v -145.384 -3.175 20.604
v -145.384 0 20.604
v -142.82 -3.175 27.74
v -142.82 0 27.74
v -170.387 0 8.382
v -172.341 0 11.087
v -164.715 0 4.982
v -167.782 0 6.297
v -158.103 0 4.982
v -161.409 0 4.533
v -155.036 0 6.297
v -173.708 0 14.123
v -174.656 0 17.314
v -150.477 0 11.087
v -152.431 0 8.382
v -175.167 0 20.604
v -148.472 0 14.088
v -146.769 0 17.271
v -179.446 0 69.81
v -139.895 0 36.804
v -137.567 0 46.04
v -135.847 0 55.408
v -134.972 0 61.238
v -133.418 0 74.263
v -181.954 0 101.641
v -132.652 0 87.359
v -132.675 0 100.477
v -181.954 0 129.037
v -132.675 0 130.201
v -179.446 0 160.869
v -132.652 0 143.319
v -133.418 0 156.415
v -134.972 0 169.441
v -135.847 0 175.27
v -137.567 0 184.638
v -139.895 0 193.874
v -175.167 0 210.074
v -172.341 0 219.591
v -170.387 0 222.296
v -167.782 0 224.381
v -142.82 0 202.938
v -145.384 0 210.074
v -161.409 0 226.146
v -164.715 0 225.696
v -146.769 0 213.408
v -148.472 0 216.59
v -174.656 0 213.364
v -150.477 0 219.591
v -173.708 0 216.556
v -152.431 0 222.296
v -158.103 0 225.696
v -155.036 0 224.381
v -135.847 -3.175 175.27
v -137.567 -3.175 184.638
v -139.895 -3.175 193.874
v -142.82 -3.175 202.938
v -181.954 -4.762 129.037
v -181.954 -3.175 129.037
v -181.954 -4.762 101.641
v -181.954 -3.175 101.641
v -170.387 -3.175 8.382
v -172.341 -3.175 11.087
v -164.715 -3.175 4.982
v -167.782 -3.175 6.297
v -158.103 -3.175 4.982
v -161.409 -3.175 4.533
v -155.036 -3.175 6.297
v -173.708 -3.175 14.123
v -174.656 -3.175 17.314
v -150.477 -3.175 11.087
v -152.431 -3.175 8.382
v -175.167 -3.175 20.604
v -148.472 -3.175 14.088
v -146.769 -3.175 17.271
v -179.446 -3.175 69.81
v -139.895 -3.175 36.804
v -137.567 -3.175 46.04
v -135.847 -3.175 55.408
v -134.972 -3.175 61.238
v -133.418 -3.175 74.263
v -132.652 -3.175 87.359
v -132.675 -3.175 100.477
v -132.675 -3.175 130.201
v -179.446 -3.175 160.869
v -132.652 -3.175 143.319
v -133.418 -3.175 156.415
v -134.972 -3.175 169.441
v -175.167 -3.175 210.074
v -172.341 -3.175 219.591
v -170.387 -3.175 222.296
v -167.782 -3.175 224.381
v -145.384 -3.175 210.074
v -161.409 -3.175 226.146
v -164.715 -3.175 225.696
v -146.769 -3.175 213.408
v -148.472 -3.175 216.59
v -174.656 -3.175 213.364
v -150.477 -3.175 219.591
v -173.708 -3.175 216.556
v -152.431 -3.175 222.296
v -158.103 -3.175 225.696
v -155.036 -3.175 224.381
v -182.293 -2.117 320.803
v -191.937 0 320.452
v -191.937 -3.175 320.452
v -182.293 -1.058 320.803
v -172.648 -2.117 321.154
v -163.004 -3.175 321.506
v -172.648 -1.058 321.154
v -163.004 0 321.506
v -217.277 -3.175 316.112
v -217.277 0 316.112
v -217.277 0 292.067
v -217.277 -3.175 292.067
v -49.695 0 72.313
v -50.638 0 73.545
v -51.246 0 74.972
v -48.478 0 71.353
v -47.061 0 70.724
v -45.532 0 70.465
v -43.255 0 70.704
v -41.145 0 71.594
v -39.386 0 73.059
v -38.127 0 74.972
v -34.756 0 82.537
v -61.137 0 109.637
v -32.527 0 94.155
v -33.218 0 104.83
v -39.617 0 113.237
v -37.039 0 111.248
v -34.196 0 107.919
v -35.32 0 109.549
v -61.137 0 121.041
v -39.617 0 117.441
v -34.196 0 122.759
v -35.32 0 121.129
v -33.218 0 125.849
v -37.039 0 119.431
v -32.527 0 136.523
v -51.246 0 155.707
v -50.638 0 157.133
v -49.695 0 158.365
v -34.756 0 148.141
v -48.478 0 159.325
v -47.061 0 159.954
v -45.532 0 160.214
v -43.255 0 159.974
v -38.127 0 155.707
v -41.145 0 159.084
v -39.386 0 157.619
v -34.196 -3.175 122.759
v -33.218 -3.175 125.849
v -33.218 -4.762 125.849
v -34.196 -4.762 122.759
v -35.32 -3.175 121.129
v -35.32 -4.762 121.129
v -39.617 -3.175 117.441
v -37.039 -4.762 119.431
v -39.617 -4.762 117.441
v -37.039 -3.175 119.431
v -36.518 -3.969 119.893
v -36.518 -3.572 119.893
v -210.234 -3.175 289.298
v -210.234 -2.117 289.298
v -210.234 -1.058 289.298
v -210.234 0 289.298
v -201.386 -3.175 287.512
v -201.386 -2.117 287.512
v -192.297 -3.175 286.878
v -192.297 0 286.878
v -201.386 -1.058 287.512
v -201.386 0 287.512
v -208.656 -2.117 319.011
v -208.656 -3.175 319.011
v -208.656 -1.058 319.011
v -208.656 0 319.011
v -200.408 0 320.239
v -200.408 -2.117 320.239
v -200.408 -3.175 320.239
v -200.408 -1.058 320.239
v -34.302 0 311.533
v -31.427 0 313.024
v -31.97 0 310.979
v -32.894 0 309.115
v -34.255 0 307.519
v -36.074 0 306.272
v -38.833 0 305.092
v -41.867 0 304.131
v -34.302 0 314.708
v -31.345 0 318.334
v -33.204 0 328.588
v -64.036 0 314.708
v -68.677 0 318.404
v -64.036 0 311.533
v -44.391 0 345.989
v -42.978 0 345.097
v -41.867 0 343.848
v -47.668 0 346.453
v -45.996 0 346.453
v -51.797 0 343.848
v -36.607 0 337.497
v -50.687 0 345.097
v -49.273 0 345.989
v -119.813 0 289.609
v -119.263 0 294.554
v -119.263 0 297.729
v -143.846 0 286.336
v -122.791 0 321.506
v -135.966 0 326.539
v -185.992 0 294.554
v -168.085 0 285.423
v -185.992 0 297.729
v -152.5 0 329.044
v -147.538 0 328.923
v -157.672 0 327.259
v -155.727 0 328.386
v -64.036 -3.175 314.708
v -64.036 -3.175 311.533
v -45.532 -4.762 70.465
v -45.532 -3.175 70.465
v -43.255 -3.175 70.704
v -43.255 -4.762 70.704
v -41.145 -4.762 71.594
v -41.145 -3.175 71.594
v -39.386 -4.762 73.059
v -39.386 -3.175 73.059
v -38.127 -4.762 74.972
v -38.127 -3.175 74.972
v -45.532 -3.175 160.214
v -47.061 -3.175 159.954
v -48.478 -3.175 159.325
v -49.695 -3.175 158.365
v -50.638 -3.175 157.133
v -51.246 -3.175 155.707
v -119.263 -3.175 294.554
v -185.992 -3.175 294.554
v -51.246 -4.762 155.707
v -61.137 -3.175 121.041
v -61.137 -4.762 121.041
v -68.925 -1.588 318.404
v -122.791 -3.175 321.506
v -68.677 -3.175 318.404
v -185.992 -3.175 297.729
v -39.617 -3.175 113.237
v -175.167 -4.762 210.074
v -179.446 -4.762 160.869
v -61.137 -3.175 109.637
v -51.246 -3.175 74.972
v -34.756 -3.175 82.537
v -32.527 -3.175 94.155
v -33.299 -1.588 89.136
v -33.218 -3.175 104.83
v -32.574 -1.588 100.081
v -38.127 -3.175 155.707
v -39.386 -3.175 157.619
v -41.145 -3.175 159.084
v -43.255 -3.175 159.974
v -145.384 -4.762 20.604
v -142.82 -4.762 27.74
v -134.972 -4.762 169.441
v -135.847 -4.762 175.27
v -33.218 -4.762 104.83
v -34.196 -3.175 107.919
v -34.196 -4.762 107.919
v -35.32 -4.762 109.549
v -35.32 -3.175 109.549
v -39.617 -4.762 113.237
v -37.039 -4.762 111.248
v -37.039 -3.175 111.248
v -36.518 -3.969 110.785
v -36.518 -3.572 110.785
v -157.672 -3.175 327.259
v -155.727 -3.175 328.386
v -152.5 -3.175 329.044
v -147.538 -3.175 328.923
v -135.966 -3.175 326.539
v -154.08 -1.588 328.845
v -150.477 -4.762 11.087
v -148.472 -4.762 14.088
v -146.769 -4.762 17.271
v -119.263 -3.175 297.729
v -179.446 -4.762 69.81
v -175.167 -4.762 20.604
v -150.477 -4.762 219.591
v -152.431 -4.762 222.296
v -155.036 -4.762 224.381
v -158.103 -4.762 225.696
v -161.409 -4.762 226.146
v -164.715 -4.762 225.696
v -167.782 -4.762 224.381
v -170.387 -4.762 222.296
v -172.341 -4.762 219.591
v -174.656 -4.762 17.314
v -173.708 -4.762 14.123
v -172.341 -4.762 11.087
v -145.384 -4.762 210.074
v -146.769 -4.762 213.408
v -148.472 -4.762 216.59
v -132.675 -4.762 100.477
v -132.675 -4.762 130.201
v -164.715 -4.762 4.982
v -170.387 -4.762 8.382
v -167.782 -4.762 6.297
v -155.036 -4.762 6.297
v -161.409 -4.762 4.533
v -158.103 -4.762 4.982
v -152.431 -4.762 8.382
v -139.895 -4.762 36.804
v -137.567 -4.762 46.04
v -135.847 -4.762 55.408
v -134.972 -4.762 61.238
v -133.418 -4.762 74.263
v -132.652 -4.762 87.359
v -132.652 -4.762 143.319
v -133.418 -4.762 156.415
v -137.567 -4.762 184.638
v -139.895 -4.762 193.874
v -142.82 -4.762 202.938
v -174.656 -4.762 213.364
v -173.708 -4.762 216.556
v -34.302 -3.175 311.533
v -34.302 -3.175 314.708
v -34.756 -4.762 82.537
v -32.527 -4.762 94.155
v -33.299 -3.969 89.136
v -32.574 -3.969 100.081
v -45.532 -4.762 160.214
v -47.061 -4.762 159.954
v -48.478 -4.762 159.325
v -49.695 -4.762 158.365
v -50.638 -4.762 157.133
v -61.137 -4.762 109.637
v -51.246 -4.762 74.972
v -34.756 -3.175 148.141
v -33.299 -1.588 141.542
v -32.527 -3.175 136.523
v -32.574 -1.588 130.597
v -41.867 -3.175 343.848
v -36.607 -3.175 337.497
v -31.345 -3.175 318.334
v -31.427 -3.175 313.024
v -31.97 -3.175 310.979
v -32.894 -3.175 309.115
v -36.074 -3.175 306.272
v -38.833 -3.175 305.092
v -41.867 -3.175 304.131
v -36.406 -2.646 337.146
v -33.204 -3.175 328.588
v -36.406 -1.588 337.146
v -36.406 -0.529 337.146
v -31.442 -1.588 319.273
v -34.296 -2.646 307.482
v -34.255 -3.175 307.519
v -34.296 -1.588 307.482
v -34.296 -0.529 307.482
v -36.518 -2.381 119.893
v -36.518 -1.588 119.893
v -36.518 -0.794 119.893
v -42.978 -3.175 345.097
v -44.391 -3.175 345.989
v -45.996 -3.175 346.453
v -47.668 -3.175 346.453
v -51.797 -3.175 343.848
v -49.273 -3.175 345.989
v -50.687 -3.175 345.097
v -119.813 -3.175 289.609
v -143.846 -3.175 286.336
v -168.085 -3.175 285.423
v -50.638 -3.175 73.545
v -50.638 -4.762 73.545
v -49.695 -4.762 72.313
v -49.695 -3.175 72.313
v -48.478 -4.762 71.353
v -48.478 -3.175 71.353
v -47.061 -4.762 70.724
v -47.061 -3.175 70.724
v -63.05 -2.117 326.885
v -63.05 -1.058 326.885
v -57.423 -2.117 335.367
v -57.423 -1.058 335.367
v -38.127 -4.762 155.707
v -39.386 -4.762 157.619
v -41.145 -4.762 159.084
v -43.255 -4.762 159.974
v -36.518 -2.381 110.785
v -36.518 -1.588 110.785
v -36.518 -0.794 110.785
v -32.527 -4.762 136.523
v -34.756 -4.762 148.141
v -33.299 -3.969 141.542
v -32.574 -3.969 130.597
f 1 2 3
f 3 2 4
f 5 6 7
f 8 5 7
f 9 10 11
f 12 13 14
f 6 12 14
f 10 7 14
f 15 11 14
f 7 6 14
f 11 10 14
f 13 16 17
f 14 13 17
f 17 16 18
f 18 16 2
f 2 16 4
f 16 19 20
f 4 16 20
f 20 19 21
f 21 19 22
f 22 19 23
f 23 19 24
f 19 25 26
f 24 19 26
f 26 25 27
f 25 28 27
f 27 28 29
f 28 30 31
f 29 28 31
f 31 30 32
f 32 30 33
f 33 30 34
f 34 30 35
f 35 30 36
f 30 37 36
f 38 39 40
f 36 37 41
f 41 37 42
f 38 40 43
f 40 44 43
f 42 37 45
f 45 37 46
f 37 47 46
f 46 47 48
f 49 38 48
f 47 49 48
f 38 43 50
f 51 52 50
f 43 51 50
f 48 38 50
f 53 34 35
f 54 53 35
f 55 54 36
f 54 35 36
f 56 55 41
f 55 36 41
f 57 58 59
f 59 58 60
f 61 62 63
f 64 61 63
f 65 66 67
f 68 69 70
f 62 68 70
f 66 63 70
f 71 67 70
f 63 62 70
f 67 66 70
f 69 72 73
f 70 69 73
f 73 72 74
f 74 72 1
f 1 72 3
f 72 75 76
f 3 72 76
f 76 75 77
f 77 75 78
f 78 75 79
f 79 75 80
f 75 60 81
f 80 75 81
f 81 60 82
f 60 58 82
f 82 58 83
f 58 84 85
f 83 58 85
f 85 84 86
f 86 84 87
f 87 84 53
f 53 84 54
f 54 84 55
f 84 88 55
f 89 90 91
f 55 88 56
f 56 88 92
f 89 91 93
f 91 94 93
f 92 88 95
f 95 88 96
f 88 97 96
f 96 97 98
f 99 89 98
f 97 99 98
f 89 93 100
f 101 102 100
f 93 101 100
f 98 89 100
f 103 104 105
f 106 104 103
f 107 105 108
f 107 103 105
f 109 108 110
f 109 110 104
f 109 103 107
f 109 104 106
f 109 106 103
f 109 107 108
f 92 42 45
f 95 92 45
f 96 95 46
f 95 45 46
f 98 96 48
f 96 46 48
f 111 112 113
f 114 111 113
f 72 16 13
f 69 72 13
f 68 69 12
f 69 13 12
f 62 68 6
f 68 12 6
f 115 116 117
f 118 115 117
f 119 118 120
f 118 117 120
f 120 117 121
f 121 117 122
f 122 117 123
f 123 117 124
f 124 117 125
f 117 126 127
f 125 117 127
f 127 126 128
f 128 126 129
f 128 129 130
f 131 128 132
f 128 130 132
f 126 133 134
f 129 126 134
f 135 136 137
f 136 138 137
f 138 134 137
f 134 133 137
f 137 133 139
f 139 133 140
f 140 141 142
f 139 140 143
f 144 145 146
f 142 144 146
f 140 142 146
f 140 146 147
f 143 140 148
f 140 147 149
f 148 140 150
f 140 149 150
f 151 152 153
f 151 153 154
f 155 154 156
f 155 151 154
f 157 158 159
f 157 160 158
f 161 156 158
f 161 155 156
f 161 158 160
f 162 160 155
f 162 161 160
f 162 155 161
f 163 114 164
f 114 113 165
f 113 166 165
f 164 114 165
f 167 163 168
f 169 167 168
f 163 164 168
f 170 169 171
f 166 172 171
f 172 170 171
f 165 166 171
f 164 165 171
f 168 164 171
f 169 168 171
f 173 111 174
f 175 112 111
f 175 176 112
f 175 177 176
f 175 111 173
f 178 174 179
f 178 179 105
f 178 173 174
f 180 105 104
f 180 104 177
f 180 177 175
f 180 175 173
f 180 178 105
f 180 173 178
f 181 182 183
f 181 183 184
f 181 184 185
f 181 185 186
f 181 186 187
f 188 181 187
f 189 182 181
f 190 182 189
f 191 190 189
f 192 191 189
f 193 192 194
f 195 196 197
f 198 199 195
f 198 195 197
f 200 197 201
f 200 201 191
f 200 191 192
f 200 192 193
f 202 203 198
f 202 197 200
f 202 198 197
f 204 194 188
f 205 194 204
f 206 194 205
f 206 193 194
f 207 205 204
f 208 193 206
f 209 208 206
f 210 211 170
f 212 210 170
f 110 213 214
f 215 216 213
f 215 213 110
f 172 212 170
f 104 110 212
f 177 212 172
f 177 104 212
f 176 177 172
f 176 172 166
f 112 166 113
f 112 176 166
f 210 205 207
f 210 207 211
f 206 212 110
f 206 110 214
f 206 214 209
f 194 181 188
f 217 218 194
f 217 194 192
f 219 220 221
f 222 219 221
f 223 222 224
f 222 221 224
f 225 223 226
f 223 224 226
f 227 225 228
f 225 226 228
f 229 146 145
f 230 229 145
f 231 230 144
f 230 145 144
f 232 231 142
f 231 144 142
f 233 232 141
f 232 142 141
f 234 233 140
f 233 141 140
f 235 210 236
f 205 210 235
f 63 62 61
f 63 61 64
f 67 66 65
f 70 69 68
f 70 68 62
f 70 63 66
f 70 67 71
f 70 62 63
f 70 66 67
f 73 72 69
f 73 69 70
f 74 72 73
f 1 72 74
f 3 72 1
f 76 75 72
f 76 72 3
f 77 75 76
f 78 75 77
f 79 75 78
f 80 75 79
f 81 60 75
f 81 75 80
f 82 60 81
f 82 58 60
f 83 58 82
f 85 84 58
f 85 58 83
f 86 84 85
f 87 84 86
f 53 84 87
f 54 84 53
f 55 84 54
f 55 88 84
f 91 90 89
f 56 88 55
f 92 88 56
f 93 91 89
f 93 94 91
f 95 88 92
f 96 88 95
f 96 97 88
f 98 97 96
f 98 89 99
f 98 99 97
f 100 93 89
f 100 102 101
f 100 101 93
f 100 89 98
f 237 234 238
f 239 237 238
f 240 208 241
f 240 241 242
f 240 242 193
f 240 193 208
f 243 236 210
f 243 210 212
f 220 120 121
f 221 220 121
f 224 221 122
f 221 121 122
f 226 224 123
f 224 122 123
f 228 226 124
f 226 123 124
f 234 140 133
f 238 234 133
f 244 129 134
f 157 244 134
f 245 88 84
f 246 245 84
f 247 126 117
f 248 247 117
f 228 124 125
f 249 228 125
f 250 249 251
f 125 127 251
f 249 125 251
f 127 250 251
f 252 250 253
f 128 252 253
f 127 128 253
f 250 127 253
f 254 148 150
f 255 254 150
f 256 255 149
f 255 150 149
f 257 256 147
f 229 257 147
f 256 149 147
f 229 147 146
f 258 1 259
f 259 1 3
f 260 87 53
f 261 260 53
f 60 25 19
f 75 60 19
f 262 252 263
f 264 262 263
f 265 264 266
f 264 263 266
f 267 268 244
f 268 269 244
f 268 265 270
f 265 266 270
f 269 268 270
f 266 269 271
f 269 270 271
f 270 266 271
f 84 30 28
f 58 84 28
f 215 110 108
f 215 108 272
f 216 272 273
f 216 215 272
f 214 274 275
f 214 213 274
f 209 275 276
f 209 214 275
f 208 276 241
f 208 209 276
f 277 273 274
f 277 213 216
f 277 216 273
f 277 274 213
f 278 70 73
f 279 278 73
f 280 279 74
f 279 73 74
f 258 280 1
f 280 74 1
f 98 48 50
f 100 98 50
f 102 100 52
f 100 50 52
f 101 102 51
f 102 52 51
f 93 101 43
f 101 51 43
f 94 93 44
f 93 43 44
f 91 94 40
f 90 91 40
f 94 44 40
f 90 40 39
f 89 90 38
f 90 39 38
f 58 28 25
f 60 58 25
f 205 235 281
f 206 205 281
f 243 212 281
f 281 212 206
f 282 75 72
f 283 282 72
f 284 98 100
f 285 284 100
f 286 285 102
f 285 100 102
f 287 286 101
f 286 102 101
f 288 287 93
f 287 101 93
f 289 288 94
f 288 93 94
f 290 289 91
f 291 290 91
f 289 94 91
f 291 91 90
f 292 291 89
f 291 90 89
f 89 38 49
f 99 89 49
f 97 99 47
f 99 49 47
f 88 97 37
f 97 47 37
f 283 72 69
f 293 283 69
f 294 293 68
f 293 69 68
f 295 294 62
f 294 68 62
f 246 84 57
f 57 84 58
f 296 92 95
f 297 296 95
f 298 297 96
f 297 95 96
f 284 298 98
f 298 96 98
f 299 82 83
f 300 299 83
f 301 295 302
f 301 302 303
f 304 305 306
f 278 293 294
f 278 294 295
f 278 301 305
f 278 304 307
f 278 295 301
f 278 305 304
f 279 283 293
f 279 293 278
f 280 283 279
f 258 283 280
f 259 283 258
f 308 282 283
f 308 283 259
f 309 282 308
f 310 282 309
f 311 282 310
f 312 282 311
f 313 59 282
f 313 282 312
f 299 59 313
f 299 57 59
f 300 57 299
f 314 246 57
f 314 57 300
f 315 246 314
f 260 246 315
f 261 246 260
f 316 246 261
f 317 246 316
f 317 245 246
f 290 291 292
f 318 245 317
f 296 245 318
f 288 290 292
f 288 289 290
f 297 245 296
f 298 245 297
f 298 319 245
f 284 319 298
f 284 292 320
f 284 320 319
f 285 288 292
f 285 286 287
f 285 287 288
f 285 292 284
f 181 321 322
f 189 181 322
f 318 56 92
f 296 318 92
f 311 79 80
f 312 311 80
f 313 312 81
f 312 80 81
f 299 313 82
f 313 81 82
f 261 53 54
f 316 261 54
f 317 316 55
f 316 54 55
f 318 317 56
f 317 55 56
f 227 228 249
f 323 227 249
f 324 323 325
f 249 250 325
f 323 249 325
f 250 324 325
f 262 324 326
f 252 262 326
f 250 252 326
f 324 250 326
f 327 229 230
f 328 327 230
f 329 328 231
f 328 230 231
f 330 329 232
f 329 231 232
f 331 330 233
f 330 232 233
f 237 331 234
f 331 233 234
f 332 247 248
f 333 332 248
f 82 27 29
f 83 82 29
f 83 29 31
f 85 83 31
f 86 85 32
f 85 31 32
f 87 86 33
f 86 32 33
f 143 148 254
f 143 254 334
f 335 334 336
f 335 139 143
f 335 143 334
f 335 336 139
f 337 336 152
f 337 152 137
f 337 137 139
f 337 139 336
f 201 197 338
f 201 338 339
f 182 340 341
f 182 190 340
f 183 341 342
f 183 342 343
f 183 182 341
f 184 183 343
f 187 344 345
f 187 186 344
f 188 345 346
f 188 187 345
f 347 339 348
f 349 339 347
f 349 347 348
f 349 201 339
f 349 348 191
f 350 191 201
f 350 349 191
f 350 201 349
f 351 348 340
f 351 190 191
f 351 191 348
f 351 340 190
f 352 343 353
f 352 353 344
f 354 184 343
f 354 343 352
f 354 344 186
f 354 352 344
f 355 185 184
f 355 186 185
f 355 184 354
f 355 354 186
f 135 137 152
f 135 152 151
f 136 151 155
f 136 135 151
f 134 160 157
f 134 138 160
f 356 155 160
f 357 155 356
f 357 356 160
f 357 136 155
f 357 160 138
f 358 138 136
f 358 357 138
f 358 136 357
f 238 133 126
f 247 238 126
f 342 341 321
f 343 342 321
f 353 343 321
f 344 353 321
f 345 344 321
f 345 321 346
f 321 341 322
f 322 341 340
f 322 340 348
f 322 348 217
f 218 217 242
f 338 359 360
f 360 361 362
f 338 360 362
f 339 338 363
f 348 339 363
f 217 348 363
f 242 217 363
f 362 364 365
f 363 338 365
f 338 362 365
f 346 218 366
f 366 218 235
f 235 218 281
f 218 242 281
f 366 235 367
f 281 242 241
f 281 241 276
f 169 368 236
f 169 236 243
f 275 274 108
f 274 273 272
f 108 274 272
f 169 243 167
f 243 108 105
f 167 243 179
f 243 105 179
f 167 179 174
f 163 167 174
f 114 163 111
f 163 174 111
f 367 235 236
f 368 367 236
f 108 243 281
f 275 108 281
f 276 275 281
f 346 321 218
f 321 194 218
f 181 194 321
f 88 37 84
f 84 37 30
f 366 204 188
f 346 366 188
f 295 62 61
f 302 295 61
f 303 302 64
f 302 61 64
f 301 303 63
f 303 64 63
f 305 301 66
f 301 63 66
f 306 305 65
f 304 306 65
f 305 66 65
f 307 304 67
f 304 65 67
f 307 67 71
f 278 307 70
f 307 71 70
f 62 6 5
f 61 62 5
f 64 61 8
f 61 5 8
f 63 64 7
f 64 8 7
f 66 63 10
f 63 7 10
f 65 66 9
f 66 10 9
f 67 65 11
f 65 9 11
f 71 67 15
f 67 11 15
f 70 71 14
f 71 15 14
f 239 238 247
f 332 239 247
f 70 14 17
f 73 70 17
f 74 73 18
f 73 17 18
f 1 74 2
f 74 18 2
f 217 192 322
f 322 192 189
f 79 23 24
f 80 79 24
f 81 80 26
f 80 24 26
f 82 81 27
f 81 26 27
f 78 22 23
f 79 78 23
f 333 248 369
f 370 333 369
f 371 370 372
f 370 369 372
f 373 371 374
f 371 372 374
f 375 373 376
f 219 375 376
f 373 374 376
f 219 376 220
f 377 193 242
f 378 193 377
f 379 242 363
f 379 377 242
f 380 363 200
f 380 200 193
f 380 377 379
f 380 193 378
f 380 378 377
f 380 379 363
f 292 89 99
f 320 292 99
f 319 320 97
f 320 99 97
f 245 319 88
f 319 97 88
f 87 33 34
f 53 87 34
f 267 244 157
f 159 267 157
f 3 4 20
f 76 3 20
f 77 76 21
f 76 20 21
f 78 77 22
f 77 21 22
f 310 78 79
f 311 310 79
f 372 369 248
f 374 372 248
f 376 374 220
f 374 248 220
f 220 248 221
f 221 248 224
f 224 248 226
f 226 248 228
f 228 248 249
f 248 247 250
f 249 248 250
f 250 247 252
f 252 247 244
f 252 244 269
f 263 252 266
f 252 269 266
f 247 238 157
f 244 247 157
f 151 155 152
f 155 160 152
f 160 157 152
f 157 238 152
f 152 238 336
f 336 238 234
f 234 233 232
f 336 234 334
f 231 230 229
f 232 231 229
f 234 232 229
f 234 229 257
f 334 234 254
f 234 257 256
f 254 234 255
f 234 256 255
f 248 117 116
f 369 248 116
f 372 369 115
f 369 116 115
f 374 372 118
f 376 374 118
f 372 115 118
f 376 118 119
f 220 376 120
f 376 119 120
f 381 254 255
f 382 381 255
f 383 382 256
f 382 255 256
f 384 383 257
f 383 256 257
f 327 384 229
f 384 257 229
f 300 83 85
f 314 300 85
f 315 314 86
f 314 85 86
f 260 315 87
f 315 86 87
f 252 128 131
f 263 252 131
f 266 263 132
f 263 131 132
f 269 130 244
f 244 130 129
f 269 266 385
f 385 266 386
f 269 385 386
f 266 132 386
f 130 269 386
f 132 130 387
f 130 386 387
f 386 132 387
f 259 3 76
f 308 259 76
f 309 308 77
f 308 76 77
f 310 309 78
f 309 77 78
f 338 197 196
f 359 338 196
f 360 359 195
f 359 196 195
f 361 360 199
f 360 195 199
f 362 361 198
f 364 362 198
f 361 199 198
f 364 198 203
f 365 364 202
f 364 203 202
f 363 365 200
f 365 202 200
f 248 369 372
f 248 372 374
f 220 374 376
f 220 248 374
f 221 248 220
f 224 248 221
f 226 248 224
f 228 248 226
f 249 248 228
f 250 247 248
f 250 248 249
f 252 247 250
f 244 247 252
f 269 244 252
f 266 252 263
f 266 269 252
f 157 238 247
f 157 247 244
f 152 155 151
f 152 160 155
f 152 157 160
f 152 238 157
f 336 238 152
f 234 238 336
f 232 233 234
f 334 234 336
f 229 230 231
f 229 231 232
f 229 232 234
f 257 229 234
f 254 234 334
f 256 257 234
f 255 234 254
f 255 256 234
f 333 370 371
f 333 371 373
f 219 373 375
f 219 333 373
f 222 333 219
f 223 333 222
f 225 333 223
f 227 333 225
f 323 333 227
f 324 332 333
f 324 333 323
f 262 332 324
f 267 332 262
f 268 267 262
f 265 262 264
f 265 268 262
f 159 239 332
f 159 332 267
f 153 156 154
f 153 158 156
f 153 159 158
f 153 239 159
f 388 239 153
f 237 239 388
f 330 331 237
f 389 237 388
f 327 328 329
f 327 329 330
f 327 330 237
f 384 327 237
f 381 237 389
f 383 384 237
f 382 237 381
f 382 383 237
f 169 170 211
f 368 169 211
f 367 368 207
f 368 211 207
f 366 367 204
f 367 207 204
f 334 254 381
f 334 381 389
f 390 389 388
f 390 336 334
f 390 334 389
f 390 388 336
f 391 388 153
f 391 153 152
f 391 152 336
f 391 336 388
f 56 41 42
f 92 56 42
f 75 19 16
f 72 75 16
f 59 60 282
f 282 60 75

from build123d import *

# Parameters (mm, degrees)
F1_DEPTH = 3.175
F2_W     = 66.7287356216
F2_H     = 3.175
F2_W_2   = 29.7339134365
F3_DEPTH = 3.1760001
F4_DEPTH = 1.5875


# Not quite as in the source:
# - a feature names something its author has since deleted; it is built from what else it names


with BuildPart() as f1:
    # F0 (on Front) → F1 (new body)
    with BuildSketch(Plane.XZ):
        with BuildLine():
            add(Edge.make_bspline(
                [(-217.2774374485, 316.1117434502), (-208.2704752684, 320.0652301311), (-200.7178515196, 320.5276429653), (-191.9366121292, 320.4519748688)],
                knots=[0, 0, 0, 0, 25.7098237378, 25.7098237378, 25.7098237378, 25.7098237378], degree=3))
            Line((-217.2774374485, 316.1117434502), (-217.2774374485, 292.066693306))
            add(Edge.make_bspline(
                [(-217.2774374485, 292.066693306), (-211.6587013006, 288.8643443584), (-200.9846866131, 286.8784666061), (-192.2965347767, 286.8784666061)],
                knots=[0, 0, 0, 0, 25.5139803752, 25.5139803752, 25.5139803752, 25.5139803752], degree=3))
            ThreePointArc((-192.2965347767, 286.8784666061), (-155.9543345014, 285.583535578), (-119.8125630617, 289.6090447903))
            Line((-119.8125630617, 289.6090447903), (-41.8674536049, 304.1306734085))
            add(Edge.make_bspline(
                [(-41.8674536049, 343.847900629), (-39.9035527612, 341.8708754749), (-35.6939266118, 337.6331173347), (-32.5058142024, 326.5151935972), (-31.3577674671, 319.4689798911), (-30.9266074047, 312.9104055483), (-33.7005376, 306.5830268044), (-39.0145912431, 304.9873280743), (-41.8674536049, 304.1306734085)],
                knots=[0, 0, 0, 0, 0.1741781632, 0.3733513087, 0.5334575375, 0.6824963743, 0.8295474219, 1, 1, 1, 1], degree=3))
            ThreePointArc((-41.8674536049, 343.847900629), (-46.8321088701, 346.5121071855), (-51.7967641354, 343.847900629))
            add(Edge.make_bspline(
                [(-68.6765983701, 318.4040486813), (-63.0499869585, 326.8853326639), (-57.4233755469, 335.3666166464), (-51.7967641354, 343.847900629)],
                knots=[0, 0, 0, 0, 30.5338894629, 30.5338894629, 30.5338894629, 30.5338894629], degree=3))
            add(Edge.make_bspline(
                [(-122.7908893077, 321.5055249581), (-96.9993255664, 319.9876210494), (-69.4583634176, 318.3667602704), (-68.7232901316, 318.4018215907), (-68.6765983701, 318.4040486813)],
                knots=[0, 0, 0, 0, 0.9364801274, 1, 1, 1, 1], degree=3))
            add(Edge.make_bspline(
                [(-163.0044796912, 321.5055249581), (-158.9115120044, 326.1343460077), (-155.7485347114, 331.5570526506), (-135.0788772106, 327.3404538631), (-122.7908893077, 321.5055249581)],
                knots=[0, 0, 0, 0, 0.3748449886, 1, 1, 1, 1], degree=3))
            add(Edge.make_bspline(
                [(-191.9366121292, 320.4519748688), (-182.2927643855, 320.8036422729), (-172.6483274348, 321.1538575539), (-163.0044796912, 321.5055249581)],
                knots=[0, 0, 0, 0, 28.9513083505, 28.9513083505, 28.9513083505, 28.9513083505], degree=3))
        make_face()
    extrude(amount=F1_DEPTH)

    # F2 (on Front) → F3 (cut, through all)
    with BuildSketch(Plane.XZ):
        with Locations((-152.6276346764, 296.1412173271)):
            Rectangle(F2_W, F2_H)
        with Locations((-49.1691168621, 313.1201070309)):
            Rectangle(F2_W_2, F2_H)
    extrude(amount=F3_DEPTH, mode=Mode.SUBTRACT)


with BuildPart() as f1b:
    # F0 (on Front) → F1, piece 2 (new body)
    with BuildSketch(Plane.XZ):
        with BuildLine():
            Line((-179.445758462, 160.8685404062), (-181.9537132978, 129.0372312069))
            Line((-181.9537132978, 129.0372312069), (-181.9537132978, 115.3391599655))
            Line((-181.9537132978, 115.3391599655), (-181.9537132978, 101.6410887241))
            Line((-181.9537132978, 101.6410887241), (-179.445758462, 69.8097795248))
            Line((-179.445758462, 69.8097795248), (-175.1670092344, 20.6041038036))
            ThreePointArc((-175.1670092344, 20.6041038036), (-174.2360127213, 15.7024883336), (-172.3408847108, 11.087179184))
            ThreePointArc((-172.3408847108, 11.087179184), (-161.4089235194, 4.5326941653), (-150.476962328, 11.087179184))
            ThreePointArc((-150.476962328, 11.087179184), (-147.5813077332, 15.658789231), (-145.3839689493, 20.6041038036))
            Line((-145.3839689493, 20.6041038036), (-142.820417881, 27.7401655912))
            ThreePointArc((-142.820417881, 27.7401655912), (-138.6554382828, 41.4030806133), (-135.8470420761, 55.4079088057))
            Line((-135.8470420761, 55.4079088057), (-134.9724531174, 61.2375587225))
            ThreePointArc((-134.9724531174, 61.2375587225), (-132.9361148448, 80.8054911513), (-132.6754838228, 100.4773676395))
            Line((-132.6754838228, 100.4773676395), (-132.6754838228, 115.3391599655))
            Line((-132.6754838228, 115.3391599655), (-132.6754838228, 130.2009522915))
            ThreePointArc((-132.6754838228, 130.2009522915), (-132.9361148448, 149.8728287797), (-134.9724531174, 169.4407612085))
            Line((-134.9724531174, 169.4407612085), (-135.8470420761, 175.2704111254))
            ThreePointArc((-135.8470420761, 175.2704111254), (-138.6554382828, 189.2752393178), (-142.820417881, 202.9381543398))
            Line((-142.820417881, 202.9381543398), (-145.3839689493, 210.0742161274))
            ThreePointArc((-145.3839689493, 210.0742161274), (-147.5813077332, 215.0195307001), (-150.476962328, 219.5911407471))
            ThreePointArc((-150.476962328, 219.5911407471), (-161.4089235194, 226.1456257657), (-172.3408847108, 219.5911407471))
            ThreePointArc((-172.3408847108, 219.5911407471), (-174.2360127213, 214.9758315974), (-175.1670092344, 210.0742161274))
            Line((-175.1670092344, 210.0742161274), (-179.445758462, 160.8685404062))
        make_face()
    extrude(amount=F1_DEPTH)


with BuildPart() as f1c:
    # F0 (on Front) → F1, piece 3 (new body)
    with BuildSketch(Plane.XZ):
        with BuildLine():
            Line((-61.1366257071, 121.0409328341), (-61.1366257071, 115.3391599655))
            Line((-61.1366257071, 115.3391599655), (-61.1366257071, 109.6373870969))
            Line((-61.1366257071, 109.6373870969), (-51.2456595898, 74.9716758728))
            ThreePointArc((-51.2456595898, 74.9716758728), (-49.1167179542, 71.795143879), (-45.5316118896, 70.4648196697))
            ThreePointArc((-45.5316118896, 70.4648196697), (-41.1453075948, 71.5941314621), (-38.1274931133, 74.9716758728))
            add(Edge.make_bspline(
                [(-38.1274931133, 74.9716758728), (-37.7114533868, 75.6467806233), (-36.6980818799, 77.2960212626), (-34.5607015396, 82.3765499704), (-33.29842215, 89.0787746733), (-32.3154011086, 94.6055276867), (-32.4336381536, 99.4259350363), (-33.0247754512, 104.611924583), (-33.218242228, 104.8295795918)],
                knots=[0, 0, 0, 0, 0.1126820004, 0.2760413664, 0.4612237316, 0.6245387092, 0.789371414, 0.9424801543, 0.9424801543, 0.9424801543, 0.9424801543], degree=3))
            add(Edge.make_bspline(
                [(-33.218242228, 104.8295795918), (-33.4641640419, 105.9295439447), (-33.9617464288, 108.1551410958), (-36.4350424059, 110.8177781387), (-38.2271971963, 112.2007073582), (-39.1778436897, 112.9094674542), (-39.617408067, 113.2371872663)],
                knots=[0, 0, 0, 0, 0.281901241, 0.5703808466, 0.801350684, 1, 1, 1, 1], degree=3))
            Line((-39.617408067, 113.2371872663), (-39.617408067, 115.3391599655))
            Line((-39.617408067, 115.3391599655), (-39.617408067, 117.4411326647))
            add(Edge.make_bspline(
                [(-33.218242228, 125.8487403393), (-33.4641640419, 124.7487759864), (-33.9617464288, 122.5231788353), (-36.4350424059, 119.8605417924), (-38.2271971963, 118.4776125728), (-39.1778436897, 117.7688524769), (-39.617408067, 117.4411326647)],
                knots=[0, 0, 0, 0, 0.281901241, 0.5703808466, 0.801350684, 1, 1, 1, 1], degree=3))
            add(Edge.make_bspline(
                [(-38.1274931133, 155.7066440582), (-37.7114533868, 155.0315393077), (-36.6980818799, 153.3822986684), (-34.5607015396, 148.3017699606), (-33.29842215, 141.5995452578), (-32.3154011086, 136.0727922443), (-32.4336381536, 131.2523848947), (-33.0247754512, 126.066395348), (-33.218242228, 125.8487403393)],
                knots=[0, 0, 0, 0, 0.1126820004, 0.2760413664, 0.4612237316, 0.6245387092, 0.789371414, 0.9424801543, 0.9424801543, 0.9424801543, 0.9424801543], degree=3))
            ThreePointArc((-38.1274931133, 155.7066440582), (-41.1453075948, 159.0841884689), (-45.5316118896, 160.2135002613))
            ThreePointArc((-45.5316118896, 160.2135002613), (-49.1167179542, 158.8831760521), (-51.2456595898, 155.7066440582))
            Line((-51.2456595898, 155.7066440582), (-61.1366257071, 121.0409328341))
        make_face()
    extrude(amount=F1_DEPTH)


with BuildPart() as f4:
    # F4 (new): a face of the model
    f4_faces = [f1b.part.faces().sort_by_distance(p)[0] for p in [
        (-157.6168541364, -3.175, 115.3391599655),
    ]]
    extrude(f4_faces, amount=F4_DEPTH)


with BuildPart() as f4b:
    # F4#2 (new): a face of the model
    f4_2_faces = [f1c.part.faces().sort_by_distance(p)[0] for p in [
        (-45.7775339149, -3.175, 115.3391599655),
    ]]
    extrude(f4_2_faces, amount=F4_DEPTH)


solid = Compound([f1.part, f1b.part, f1c.part, f4.part, f4b.part])
